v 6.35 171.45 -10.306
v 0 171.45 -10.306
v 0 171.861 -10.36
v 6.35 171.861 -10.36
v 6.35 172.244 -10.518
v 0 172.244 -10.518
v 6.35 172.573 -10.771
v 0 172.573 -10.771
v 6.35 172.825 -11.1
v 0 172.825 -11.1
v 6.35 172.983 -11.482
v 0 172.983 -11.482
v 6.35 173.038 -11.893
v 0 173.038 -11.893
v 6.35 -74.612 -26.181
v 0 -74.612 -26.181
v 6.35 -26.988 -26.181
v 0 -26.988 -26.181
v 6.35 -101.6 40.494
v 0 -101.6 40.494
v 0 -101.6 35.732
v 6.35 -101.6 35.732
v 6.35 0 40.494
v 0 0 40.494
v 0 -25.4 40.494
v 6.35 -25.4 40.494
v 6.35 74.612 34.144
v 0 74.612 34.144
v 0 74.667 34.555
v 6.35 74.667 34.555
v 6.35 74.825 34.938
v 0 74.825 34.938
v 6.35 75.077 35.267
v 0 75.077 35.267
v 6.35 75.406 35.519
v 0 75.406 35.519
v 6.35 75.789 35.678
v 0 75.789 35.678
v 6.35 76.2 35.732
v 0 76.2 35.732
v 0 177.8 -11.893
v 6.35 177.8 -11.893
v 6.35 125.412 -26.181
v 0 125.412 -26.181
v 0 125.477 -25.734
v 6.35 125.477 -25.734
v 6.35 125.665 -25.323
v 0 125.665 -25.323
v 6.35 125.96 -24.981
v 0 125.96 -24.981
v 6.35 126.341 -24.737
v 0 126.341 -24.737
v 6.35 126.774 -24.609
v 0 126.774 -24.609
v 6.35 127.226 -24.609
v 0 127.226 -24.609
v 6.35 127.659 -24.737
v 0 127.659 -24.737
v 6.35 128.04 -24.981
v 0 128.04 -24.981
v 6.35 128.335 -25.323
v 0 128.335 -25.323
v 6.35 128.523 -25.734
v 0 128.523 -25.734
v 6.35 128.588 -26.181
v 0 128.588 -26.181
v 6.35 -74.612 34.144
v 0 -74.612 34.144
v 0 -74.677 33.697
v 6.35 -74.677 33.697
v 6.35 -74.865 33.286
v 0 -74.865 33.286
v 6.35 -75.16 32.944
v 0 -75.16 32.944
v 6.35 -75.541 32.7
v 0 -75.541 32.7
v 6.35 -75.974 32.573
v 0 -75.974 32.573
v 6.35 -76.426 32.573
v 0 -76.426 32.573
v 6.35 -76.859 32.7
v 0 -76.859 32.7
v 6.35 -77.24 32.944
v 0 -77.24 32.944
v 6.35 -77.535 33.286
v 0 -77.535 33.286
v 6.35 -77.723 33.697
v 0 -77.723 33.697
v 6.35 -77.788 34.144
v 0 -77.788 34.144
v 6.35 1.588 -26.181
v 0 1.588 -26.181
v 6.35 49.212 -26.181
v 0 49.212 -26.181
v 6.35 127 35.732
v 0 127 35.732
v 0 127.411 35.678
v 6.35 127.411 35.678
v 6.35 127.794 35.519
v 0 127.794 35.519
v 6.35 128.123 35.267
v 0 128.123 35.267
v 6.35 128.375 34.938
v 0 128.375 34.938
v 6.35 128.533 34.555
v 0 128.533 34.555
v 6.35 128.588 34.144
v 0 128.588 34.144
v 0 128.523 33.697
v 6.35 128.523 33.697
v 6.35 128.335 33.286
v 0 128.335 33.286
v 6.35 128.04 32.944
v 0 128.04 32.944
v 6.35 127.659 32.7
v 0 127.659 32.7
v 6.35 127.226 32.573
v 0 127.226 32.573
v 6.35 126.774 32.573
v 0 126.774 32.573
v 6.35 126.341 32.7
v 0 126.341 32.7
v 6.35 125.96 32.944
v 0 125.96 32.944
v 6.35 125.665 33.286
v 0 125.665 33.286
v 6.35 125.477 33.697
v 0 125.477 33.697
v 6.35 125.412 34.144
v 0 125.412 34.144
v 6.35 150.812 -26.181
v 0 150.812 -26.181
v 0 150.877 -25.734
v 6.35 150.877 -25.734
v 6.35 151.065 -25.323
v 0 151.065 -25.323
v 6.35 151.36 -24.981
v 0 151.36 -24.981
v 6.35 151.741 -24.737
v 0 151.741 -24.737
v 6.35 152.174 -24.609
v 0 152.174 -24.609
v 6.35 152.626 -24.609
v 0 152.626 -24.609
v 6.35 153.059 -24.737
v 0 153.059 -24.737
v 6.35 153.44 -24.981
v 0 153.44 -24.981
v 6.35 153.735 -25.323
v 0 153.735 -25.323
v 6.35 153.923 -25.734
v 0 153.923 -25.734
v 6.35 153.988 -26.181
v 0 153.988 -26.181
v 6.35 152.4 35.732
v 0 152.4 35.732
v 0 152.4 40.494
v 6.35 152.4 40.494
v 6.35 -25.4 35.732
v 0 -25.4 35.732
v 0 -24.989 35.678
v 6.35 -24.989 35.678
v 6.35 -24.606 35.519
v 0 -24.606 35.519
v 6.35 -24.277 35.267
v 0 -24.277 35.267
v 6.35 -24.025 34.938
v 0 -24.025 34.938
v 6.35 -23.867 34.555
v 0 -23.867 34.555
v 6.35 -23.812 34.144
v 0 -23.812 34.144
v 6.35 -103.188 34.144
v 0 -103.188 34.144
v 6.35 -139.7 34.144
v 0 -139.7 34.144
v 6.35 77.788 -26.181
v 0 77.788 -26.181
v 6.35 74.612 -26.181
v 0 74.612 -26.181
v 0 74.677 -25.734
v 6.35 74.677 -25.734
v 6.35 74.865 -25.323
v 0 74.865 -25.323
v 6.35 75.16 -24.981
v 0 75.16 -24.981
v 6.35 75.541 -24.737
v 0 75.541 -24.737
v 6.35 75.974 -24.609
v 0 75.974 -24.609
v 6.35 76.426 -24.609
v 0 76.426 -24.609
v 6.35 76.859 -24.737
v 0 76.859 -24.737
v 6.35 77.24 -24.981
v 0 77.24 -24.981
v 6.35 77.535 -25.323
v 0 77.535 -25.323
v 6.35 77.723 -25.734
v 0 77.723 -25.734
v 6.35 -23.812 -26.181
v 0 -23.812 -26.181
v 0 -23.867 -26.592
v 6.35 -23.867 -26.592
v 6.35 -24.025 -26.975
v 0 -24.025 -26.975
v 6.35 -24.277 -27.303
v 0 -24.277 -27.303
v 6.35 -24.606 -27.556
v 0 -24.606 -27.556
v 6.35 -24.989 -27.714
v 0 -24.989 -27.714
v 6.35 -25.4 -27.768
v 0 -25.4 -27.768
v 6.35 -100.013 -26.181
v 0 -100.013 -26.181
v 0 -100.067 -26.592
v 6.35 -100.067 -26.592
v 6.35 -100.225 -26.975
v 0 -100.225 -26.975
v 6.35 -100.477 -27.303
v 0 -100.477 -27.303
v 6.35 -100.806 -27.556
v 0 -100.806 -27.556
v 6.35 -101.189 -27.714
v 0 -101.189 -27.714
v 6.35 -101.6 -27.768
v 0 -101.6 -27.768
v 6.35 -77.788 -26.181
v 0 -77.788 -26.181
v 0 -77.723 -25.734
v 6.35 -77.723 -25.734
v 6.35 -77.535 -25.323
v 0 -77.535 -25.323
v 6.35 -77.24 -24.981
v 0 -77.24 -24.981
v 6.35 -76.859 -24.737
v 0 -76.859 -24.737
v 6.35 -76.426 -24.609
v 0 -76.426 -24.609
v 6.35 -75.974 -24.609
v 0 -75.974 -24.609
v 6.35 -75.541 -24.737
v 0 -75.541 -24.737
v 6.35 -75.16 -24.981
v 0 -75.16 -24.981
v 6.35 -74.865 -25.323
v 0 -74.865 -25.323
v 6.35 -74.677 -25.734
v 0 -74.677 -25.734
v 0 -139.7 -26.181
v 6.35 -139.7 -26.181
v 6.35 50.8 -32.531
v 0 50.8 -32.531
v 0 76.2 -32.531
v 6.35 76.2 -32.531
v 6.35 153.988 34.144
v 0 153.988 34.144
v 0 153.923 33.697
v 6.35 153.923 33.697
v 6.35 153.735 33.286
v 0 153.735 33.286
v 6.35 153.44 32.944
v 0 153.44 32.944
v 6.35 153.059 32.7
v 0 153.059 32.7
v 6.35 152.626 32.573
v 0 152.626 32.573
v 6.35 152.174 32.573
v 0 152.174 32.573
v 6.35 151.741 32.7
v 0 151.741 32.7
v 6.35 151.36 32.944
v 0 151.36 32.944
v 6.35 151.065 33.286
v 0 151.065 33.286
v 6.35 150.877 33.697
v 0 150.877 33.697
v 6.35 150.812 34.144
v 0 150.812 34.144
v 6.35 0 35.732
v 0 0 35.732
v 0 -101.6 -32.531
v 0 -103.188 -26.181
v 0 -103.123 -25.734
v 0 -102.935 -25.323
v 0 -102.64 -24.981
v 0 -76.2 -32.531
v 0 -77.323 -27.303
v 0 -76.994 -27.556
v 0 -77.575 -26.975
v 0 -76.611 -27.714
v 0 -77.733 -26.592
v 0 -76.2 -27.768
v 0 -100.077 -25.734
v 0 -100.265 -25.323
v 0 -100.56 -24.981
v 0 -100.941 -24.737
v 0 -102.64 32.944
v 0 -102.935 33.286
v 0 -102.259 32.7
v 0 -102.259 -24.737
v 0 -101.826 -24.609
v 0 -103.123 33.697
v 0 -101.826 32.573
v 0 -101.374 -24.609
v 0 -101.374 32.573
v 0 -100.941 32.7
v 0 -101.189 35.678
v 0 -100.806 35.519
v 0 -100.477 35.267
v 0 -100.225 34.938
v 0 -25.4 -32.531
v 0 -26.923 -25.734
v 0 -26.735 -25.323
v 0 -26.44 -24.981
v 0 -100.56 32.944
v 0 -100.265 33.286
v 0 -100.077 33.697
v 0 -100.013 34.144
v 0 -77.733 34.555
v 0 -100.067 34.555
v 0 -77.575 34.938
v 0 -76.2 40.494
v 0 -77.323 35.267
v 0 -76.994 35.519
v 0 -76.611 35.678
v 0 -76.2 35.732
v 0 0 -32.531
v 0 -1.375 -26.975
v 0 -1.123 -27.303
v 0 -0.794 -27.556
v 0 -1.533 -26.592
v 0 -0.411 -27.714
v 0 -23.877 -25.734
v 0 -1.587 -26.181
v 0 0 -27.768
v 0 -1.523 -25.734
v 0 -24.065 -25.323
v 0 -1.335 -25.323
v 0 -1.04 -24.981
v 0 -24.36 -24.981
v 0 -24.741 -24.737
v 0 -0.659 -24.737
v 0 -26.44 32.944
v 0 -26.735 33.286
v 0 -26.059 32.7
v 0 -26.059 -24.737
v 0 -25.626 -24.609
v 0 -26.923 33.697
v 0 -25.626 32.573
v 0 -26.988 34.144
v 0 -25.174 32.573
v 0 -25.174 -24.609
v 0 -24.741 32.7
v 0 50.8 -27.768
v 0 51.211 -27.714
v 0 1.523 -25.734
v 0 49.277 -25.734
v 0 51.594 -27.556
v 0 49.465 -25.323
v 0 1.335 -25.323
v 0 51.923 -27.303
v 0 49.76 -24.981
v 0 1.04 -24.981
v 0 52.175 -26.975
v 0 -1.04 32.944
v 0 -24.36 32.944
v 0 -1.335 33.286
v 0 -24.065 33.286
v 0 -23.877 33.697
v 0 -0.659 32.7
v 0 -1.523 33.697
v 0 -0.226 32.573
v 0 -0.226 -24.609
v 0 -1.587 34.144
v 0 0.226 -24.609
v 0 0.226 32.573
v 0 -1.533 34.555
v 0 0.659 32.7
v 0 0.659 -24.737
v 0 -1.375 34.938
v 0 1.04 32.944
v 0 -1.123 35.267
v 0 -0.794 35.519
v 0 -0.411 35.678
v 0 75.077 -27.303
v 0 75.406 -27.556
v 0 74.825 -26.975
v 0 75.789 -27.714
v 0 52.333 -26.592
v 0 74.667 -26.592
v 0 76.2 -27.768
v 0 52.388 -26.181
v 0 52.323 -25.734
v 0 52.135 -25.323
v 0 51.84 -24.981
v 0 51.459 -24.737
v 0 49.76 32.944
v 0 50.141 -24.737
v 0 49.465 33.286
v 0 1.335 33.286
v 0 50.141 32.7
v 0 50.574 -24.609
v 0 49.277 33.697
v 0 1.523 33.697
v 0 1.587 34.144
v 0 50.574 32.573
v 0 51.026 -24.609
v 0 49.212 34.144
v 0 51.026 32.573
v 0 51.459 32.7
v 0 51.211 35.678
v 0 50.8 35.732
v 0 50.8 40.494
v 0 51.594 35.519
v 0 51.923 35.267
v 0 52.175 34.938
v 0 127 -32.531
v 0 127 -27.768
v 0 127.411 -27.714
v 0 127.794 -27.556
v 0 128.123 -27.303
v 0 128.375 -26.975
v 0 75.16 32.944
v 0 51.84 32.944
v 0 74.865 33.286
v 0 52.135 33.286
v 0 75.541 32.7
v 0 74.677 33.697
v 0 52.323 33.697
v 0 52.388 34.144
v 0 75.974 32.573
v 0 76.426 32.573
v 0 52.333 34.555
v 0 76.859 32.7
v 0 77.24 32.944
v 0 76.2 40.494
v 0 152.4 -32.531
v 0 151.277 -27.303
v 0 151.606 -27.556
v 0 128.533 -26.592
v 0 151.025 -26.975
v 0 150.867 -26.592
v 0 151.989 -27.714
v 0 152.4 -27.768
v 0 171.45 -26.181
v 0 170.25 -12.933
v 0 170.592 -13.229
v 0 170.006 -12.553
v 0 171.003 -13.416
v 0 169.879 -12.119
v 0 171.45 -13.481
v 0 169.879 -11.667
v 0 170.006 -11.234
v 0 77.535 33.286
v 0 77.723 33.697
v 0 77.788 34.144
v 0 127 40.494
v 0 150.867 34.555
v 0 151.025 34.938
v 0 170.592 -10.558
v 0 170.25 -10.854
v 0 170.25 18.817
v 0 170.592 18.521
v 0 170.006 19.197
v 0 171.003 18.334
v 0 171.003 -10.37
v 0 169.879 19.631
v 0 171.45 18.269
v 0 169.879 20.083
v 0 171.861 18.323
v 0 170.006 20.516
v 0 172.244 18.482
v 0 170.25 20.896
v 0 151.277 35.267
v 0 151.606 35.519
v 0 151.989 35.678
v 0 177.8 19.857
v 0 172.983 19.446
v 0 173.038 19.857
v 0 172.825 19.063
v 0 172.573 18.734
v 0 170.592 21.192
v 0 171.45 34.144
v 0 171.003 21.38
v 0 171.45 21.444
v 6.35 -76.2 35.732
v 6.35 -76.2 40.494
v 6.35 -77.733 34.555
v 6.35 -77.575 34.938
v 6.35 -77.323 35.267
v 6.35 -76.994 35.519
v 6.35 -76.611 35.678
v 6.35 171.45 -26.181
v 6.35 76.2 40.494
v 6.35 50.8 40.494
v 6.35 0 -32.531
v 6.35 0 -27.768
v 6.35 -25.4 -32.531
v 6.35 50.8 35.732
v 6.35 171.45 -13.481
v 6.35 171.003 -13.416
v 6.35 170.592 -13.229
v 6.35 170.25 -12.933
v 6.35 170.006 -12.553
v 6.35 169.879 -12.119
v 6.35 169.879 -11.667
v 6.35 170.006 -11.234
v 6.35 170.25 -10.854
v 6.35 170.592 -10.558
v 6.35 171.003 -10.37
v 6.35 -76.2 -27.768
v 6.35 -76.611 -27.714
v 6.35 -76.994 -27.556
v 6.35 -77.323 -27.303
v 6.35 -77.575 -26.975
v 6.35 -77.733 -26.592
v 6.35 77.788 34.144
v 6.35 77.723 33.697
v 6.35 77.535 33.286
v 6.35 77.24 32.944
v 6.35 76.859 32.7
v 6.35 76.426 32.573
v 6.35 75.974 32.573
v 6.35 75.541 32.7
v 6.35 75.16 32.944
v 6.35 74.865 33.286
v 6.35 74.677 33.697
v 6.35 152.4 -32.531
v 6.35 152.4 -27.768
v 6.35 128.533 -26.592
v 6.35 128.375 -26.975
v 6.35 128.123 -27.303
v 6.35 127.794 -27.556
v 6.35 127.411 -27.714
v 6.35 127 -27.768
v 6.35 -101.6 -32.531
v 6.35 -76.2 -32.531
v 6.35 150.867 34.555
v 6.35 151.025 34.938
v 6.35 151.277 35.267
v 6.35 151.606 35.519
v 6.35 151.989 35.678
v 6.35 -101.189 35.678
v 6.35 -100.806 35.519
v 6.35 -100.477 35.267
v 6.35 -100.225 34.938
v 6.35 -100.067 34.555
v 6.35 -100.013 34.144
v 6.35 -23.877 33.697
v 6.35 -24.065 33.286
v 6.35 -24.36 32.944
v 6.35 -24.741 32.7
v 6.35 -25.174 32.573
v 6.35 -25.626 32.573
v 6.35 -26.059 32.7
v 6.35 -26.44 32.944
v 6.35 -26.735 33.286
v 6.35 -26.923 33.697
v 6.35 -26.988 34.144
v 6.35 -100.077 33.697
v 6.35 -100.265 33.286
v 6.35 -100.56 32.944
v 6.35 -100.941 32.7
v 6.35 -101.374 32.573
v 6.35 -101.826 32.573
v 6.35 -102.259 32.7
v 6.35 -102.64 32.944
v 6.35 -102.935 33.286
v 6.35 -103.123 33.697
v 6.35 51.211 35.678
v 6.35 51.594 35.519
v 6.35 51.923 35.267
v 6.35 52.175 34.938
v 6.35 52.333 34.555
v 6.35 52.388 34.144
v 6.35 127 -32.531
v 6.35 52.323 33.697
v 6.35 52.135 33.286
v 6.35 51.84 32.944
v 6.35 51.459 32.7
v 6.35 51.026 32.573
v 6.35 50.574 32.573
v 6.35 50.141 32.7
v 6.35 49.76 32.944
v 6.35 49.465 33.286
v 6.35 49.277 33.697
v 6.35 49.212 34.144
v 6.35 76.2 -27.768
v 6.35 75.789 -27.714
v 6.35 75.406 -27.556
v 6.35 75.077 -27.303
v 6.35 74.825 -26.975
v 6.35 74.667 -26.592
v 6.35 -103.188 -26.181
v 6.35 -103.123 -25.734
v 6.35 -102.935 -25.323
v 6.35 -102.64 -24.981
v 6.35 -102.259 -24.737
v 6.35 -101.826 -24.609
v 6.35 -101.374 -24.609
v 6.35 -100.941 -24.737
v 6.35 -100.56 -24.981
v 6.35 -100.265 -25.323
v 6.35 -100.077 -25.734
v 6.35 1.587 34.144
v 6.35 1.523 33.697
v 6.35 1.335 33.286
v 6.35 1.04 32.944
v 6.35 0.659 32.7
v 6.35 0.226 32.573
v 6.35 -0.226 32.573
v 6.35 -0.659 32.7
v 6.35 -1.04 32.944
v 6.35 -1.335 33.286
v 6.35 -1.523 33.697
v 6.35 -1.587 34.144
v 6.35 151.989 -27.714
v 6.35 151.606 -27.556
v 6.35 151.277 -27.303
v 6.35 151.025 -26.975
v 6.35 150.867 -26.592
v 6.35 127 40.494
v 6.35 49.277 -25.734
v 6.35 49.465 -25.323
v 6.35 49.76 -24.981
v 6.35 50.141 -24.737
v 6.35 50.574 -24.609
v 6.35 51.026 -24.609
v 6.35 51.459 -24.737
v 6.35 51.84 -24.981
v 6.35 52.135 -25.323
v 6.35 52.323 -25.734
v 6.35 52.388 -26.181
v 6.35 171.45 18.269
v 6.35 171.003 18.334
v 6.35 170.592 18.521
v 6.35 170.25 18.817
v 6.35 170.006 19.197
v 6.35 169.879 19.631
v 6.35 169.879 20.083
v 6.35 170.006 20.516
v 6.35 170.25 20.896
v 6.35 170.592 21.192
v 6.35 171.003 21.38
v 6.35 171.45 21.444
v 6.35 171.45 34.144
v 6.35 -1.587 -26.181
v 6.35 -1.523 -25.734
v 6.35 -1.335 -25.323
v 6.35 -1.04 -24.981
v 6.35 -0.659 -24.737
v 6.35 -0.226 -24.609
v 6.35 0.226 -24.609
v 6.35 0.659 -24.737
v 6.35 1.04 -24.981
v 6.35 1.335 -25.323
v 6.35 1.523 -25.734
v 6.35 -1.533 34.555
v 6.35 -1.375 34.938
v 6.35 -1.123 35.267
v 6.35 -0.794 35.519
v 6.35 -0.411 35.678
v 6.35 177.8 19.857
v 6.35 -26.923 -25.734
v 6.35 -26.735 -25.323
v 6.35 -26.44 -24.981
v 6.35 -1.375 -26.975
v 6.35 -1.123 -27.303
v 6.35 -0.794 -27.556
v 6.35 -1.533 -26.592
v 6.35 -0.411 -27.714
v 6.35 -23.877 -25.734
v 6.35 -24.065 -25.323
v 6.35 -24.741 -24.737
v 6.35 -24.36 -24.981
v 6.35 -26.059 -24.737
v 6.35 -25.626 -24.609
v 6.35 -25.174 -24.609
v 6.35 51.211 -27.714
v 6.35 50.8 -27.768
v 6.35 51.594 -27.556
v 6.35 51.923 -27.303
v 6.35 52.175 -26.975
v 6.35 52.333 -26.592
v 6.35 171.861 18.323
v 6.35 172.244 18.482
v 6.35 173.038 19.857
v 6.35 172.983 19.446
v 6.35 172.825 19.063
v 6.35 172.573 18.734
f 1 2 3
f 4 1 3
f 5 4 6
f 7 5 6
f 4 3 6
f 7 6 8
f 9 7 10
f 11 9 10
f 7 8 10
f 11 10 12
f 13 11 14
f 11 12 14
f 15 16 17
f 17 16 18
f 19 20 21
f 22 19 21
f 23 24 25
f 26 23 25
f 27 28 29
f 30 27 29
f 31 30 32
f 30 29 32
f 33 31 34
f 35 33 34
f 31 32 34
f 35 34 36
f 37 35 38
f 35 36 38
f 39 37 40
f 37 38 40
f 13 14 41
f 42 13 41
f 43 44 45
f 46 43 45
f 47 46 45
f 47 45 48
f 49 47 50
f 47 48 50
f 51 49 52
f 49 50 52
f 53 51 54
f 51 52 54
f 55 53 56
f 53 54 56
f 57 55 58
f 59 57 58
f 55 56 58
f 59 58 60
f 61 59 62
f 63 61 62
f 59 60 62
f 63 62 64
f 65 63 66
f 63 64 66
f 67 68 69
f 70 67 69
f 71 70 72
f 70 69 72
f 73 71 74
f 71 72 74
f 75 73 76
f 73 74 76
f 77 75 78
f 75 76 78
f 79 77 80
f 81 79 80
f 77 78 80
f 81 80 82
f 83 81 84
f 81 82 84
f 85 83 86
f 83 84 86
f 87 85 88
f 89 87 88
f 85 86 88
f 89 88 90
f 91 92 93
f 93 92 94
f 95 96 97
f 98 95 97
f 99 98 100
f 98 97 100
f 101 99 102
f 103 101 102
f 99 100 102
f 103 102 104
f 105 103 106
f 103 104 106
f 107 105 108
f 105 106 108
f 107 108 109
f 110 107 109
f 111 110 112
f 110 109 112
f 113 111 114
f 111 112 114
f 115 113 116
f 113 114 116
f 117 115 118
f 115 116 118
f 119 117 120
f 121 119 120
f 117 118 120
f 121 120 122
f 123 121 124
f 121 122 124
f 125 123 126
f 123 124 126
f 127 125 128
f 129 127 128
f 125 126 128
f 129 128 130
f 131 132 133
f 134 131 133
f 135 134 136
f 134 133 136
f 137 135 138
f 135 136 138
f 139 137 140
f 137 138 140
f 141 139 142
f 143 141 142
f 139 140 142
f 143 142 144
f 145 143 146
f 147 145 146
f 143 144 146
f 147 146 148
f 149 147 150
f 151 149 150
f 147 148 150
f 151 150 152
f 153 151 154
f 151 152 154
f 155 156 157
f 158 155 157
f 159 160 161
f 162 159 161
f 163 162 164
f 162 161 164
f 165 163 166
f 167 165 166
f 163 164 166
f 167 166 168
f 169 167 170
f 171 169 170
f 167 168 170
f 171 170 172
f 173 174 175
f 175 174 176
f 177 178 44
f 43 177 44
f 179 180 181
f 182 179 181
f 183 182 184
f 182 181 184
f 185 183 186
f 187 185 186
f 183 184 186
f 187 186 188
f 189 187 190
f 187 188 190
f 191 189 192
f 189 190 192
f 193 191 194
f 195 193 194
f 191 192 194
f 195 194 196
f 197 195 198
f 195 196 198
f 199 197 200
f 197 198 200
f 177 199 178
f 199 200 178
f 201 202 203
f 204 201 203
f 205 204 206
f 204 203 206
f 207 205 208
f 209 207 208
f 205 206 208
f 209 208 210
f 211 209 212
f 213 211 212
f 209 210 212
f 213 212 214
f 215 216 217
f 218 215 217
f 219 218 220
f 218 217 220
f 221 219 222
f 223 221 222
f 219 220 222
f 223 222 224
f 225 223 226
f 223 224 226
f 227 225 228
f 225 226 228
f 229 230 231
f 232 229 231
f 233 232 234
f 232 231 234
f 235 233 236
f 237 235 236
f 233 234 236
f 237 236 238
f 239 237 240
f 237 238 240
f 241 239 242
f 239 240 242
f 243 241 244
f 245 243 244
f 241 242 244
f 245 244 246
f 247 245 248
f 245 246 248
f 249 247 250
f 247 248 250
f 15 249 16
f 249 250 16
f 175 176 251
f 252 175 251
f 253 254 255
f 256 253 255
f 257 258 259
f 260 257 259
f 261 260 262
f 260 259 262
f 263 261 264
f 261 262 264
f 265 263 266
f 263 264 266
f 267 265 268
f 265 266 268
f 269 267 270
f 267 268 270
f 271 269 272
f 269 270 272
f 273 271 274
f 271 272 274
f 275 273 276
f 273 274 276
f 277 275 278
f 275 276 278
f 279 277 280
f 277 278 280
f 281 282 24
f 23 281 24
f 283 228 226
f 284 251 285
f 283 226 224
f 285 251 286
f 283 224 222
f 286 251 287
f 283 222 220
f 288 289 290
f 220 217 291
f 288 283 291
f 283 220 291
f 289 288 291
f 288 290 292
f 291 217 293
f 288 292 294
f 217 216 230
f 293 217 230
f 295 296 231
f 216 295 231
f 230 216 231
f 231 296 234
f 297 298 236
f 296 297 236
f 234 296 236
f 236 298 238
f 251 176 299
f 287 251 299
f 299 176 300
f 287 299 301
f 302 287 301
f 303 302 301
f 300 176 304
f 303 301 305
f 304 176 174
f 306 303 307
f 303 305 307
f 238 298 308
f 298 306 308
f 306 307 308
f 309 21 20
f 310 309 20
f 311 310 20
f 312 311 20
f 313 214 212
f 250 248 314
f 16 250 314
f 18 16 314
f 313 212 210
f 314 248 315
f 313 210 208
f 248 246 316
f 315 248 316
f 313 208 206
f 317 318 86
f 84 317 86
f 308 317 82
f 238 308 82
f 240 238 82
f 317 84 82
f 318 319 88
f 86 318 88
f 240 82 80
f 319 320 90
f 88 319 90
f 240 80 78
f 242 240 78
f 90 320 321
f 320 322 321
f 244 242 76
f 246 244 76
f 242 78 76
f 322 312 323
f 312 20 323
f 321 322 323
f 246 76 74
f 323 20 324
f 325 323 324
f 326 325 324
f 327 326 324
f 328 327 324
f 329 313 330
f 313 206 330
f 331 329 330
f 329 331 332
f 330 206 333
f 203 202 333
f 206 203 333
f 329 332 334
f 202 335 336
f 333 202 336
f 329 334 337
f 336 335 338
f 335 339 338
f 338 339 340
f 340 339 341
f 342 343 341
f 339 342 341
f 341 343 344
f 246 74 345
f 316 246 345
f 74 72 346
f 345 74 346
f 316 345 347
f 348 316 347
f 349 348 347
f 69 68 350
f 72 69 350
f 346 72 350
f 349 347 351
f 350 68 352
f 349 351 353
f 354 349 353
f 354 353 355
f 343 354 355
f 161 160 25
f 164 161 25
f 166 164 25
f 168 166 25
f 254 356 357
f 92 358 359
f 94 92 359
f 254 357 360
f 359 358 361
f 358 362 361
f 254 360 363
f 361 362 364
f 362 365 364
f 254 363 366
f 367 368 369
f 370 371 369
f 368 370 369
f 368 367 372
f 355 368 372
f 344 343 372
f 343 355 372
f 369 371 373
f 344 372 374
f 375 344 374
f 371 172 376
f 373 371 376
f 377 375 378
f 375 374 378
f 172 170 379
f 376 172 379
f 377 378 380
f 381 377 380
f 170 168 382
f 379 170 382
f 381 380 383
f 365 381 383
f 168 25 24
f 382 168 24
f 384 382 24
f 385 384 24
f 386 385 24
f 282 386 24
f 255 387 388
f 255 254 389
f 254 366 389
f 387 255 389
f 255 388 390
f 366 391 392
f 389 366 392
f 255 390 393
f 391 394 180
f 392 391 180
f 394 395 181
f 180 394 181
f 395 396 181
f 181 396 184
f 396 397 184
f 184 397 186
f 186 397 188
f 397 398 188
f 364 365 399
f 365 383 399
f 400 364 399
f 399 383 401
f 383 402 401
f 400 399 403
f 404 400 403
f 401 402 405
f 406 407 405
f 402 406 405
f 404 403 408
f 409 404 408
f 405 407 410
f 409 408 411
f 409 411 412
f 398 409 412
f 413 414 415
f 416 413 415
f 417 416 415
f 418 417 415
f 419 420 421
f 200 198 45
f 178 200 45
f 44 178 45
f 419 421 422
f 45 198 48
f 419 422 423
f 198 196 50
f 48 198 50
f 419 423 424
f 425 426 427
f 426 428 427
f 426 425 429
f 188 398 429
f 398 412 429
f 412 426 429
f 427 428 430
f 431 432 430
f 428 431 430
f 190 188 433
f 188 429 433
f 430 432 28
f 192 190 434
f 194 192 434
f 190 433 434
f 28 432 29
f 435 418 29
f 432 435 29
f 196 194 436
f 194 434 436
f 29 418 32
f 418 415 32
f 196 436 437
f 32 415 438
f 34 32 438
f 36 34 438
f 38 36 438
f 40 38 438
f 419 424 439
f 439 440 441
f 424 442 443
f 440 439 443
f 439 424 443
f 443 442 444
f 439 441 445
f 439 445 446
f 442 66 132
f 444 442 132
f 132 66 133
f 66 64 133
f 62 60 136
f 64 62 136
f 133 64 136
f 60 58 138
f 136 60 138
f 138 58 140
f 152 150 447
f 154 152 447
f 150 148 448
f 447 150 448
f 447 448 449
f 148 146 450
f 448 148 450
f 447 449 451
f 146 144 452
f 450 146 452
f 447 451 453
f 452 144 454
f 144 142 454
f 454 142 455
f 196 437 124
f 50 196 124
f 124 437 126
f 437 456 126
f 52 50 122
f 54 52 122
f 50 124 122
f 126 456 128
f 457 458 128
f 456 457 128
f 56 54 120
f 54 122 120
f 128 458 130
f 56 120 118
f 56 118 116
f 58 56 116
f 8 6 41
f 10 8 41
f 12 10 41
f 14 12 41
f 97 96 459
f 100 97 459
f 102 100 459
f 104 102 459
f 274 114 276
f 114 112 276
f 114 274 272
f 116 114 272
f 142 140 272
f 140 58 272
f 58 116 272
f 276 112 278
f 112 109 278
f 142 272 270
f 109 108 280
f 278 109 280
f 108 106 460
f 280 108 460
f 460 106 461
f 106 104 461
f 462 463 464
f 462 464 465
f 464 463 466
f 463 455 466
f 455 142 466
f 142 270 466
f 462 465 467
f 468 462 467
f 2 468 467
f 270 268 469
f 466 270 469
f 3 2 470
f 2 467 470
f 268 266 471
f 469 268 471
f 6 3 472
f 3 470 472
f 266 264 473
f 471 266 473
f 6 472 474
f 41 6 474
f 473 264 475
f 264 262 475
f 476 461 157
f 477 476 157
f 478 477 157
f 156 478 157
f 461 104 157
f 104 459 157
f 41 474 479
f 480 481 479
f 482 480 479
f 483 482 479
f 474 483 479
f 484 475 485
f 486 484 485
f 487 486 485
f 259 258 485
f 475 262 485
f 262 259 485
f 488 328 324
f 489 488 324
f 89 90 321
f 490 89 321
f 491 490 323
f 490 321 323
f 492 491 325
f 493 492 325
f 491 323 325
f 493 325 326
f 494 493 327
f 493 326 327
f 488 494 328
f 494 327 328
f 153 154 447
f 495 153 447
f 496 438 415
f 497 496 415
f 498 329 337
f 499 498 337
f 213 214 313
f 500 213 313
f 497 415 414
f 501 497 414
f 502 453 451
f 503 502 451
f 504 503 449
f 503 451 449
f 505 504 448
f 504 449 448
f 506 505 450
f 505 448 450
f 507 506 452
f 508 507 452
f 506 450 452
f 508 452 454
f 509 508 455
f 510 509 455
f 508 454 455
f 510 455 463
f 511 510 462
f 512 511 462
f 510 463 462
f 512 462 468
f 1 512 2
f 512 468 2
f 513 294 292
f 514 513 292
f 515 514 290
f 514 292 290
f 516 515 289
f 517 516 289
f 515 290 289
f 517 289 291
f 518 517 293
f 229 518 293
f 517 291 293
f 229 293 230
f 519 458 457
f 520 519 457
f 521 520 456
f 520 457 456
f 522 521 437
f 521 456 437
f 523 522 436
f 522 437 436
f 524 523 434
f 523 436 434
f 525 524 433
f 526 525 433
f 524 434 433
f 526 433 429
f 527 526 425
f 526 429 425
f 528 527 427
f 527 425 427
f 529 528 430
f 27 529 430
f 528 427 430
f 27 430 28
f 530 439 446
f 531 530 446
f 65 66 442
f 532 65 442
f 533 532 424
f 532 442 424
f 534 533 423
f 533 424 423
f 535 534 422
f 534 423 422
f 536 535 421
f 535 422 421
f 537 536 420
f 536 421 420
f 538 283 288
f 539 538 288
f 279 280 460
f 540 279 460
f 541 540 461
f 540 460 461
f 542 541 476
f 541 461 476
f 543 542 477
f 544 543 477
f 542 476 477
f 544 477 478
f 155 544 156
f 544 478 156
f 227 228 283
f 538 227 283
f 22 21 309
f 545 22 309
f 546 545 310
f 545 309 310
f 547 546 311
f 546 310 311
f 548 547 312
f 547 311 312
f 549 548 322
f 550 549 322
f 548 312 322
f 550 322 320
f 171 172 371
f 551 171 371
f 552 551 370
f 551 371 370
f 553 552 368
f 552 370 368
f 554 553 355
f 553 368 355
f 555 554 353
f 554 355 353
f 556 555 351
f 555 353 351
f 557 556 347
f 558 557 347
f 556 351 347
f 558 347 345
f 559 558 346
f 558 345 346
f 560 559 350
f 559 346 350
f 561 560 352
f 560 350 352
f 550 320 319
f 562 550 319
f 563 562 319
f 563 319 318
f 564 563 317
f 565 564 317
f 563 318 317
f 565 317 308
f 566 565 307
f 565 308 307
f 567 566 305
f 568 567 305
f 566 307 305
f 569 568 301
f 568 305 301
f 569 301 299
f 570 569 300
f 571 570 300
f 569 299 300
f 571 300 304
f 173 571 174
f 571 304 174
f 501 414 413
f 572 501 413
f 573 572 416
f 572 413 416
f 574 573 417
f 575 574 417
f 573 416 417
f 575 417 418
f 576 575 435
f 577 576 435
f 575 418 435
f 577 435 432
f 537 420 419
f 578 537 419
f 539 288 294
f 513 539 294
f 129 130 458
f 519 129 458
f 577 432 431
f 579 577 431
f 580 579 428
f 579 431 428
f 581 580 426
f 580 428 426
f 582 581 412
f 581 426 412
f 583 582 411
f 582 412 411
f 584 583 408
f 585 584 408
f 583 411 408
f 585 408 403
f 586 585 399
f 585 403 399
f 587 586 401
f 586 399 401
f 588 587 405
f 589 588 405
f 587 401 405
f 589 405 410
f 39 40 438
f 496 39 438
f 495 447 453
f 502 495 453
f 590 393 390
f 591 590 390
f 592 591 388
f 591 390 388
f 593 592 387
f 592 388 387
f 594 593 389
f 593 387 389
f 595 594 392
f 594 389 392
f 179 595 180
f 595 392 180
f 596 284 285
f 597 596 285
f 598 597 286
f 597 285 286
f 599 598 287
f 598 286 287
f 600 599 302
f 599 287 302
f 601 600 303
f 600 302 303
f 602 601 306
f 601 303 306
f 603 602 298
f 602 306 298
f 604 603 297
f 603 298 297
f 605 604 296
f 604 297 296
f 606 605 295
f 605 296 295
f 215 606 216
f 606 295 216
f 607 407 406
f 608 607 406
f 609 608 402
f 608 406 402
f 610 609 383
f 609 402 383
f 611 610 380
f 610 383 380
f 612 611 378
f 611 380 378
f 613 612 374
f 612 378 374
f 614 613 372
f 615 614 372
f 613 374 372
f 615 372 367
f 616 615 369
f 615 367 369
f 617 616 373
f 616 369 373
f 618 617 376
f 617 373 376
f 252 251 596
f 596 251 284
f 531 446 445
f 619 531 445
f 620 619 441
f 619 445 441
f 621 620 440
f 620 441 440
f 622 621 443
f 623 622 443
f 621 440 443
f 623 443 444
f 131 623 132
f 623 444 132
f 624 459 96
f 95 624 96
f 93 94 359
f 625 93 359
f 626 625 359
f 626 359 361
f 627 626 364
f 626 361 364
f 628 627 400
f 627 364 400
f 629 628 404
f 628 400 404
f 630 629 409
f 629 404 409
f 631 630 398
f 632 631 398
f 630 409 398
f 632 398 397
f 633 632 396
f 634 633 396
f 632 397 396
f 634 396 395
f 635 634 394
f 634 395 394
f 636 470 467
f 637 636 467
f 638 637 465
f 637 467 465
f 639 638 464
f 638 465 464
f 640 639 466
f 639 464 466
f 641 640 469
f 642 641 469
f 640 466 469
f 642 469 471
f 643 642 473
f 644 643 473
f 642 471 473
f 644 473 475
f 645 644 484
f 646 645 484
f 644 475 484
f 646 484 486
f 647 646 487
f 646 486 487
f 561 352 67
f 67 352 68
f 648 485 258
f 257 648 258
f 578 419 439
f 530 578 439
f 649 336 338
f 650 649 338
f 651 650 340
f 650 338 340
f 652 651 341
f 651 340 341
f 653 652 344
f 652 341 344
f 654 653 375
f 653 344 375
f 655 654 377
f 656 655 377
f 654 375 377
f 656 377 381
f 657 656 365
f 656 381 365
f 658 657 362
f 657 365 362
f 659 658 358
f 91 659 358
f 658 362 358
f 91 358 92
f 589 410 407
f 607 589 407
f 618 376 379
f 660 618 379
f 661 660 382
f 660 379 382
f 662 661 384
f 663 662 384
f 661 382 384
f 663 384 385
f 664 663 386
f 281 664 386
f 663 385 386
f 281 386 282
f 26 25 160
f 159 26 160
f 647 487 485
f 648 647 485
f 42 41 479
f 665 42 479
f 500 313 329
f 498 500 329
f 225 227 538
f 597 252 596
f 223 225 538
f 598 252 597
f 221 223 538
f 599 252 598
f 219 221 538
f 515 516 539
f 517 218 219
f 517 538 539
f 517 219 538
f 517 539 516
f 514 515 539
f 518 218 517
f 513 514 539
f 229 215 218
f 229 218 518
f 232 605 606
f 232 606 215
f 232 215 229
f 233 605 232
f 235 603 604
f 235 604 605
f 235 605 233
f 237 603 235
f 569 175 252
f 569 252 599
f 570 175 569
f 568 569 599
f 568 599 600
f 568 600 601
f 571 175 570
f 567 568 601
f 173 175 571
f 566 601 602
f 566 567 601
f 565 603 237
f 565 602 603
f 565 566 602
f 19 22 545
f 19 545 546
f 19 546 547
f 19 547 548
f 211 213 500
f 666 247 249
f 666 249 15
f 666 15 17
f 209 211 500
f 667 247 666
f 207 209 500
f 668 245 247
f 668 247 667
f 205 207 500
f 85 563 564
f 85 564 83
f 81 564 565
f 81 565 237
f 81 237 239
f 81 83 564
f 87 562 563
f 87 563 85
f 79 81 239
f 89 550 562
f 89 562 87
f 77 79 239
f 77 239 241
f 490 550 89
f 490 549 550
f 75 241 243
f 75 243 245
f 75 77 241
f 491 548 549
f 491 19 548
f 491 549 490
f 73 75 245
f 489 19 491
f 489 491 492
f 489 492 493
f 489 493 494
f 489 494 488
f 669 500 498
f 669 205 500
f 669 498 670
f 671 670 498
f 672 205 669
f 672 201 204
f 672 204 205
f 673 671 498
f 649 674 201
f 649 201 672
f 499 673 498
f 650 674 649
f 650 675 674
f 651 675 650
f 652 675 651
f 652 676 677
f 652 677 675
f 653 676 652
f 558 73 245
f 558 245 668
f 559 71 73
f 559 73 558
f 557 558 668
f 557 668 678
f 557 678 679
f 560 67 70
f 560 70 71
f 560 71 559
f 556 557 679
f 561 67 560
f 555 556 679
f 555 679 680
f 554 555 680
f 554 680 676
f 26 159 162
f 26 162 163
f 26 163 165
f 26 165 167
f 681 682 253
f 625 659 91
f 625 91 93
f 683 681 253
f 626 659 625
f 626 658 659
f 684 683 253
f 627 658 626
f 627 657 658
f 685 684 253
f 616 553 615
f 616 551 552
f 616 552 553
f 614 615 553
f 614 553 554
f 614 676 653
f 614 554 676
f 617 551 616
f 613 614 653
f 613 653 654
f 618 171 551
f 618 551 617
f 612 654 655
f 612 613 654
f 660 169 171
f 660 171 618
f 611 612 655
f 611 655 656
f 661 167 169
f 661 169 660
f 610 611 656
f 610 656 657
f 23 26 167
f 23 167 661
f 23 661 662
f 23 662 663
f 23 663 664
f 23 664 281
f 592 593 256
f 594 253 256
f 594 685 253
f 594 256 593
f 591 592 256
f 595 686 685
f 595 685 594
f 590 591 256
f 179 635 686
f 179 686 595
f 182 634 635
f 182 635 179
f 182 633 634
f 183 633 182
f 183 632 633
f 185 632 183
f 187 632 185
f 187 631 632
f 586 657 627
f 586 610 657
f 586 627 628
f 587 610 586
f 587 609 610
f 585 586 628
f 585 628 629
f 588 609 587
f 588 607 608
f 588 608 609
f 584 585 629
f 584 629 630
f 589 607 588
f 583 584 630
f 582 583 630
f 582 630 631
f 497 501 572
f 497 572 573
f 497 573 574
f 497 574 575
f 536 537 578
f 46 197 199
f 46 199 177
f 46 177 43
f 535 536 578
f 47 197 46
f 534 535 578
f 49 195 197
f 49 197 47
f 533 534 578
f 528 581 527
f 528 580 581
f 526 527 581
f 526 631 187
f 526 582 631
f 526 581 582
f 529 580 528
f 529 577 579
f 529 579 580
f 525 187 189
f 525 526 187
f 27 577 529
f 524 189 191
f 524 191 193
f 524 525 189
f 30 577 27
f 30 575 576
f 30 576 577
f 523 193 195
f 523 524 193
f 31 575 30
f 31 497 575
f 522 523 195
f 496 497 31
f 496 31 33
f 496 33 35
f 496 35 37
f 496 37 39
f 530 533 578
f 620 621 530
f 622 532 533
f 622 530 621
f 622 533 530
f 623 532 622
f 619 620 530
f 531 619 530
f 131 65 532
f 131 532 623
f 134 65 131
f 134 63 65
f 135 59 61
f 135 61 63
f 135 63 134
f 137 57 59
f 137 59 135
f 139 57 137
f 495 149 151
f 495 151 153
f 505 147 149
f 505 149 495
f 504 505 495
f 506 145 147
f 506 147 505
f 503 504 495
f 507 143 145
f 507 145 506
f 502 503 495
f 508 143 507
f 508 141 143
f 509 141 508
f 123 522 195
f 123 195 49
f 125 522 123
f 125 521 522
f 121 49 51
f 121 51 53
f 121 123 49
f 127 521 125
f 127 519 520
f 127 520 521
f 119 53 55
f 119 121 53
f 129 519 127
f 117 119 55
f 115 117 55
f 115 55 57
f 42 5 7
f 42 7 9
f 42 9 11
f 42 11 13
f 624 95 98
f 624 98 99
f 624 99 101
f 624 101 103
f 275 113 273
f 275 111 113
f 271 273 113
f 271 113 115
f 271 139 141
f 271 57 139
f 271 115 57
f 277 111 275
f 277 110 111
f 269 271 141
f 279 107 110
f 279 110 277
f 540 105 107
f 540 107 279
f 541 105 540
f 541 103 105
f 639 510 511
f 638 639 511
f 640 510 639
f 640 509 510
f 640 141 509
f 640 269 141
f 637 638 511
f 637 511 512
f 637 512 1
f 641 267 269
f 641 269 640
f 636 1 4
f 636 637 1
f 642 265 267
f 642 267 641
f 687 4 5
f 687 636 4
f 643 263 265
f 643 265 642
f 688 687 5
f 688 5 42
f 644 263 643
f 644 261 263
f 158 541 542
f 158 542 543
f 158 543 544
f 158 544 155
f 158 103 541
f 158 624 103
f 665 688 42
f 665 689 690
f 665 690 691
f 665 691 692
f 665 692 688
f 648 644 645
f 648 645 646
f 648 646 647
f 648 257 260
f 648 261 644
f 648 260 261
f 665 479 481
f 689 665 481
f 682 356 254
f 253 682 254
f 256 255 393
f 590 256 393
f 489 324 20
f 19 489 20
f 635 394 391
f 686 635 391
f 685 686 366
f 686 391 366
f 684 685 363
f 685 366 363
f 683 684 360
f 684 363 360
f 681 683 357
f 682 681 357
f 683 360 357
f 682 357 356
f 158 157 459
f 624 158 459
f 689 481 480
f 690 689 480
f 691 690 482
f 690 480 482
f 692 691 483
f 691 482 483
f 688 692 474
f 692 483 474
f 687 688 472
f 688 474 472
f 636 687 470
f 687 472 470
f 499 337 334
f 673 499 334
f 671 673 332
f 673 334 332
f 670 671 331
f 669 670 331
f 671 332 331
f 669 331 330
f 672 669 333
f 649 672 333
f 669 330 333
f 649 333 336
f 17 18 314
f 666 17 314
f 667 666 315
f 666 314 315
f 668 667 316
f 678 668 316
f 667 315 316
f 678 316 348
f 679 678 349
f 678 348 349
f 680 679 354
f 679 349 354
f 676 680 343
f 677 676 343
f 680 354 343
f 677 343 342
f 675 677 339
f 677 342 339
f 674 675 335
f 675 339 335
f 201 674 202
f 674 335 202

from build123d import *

# Parameters (mm, degrees)
F1_DEPTH = 6.35


with BuildPart() as f1:
    # F0 (on Right) → F1 (new body)
    with BuildSketch(Plane.YZ):
        with BuildLine():
            Line((-77.7875, 34.144226), (-100.0125, 34.144226))
            ThreePointArc((-100.0125, 34.144226), (-101.6, 32.556726), (-103.1875, 34.144226))
            Line((-103.1875, 34.144226), (-139.7, 34.144226))
            Line((-139.7, 34.144226), (-139.7, -26.180774))
            Line((-139.7, -26.180774), (-103.1875, -26.180774))
            ThreePointArc((-103.1875, -26.180774), (-101.6, -24.593274), (-100.0125, -26.180774))
            Line((-100.0125, -26.180774), (-77.7875, -26.180774))
            ThreePointArc((-77.7875, -26.180774), (-76.2, -24.593274), (-74.6125, -26.180774))
            Line((-74.6125, -26.180774), (-26.9875, -26.180774))
            ThreePointArc((-26.9875, -26.180774), (-25.4, -24.593274), (-23.8125, -26.180774))
            Line((-23.8125, -26.180774), (-1.5875, -26.180774))
            ThreePointArc((-1.5875, -26.180774), (0, -24.593274), (1.5875, -26.180774))
            Line((1.5875, -26.180774), (49.2125, -26.180774))
            ThreePointArc((49.2125, -26.180774), (50.8, -24.593274), (52.3875, -26.180774))
            Line((52.3875, -26.180774), (74.6125, -26.180774))
            ThreePointArc((74.6125, -26.180774), (76.2, -24.593274), (77.7875, -26.180774))
            Line((77.7875, -26.180774), (125.4125, -26.180774))
            ThreePointArc((125.4125, -26.180774), (127, -24.593274), (128.5875, -26.180774))
            Line((128.5875, -26.180774), (150.8125, -26.180774))
            ThreePointArc((150.8125, -26.180774), (152.4, -24.593274), (153.9875, -26.180774))
            Line((153.9875, -26.180774), (171.45, -26.180774))
            Line((171.45, -26.180774), (171.45, -13.480774))
            ThreePointArc((171.45, -13.480774), (169.8625, -11.893274), (171.45, -10.305774))
            Line((171.45, -10.305774), (171.45, 18.269226))
            ThreePointArc((171.45, 18.269226), (169.8625, 19.856726), (171.45, 21.444226))
            Line((171.45, 21.444226), (171.45, 34.144226))
            Line((171.45, 34.144226), (153.9875, 34.144226))
            ThreePointArc((153.9875, 34.144226), (152.4, 32.556726), (150.8125, 34.144226))
            Line((150.8125, 34.144226), (128.5875, 34.144226))
            ThreePointArc((128.5875, 34.144226), (127, 32.556726), (125.4125, 34.144226))
            Line((125.4125, 34.144226), (77.7875, 34.144226))
            ThreePointArc((77.7875, 34.144226), (76.2, 32.556726), (74.6125, 34.144226))
            Line((74.6125, 34.144226), (52.3875, 34.144226))
            ThreePointArc((52.3875, 34.144226), (50.8, 32.556726), (49.2125, 34.144226))
            Line((49.2125, 34.144226), (1.5875, 34.144226))
            ThreePointArc((1.5875, 34.144226), (0, 32.556726), (-1.5875, 34.144226))
            Line((-1.5875, 34.144226), (-23.8125, 34.144226))
            ThreePointArc((-23.8125, 34.144226), (-25.4, 32.556726), (-26.9875, 34.144226))
            Line((-26.9875, 34.144226), (-74.6125, 34.144226))
            ThreePointArc((-74.6125, 34.144226), (-76.2, 32.556726), (-77.7875, 34.144226))
        make_face()
        with BuildLine():
            ThreePointArc((-101.6, 35.731726), (-100.477468, 35.266758), (-100.0125, 34.144226))
            Line((-100.0125, 34.144226), (-77.7875, 34.144226))
            ThreePointArc((-77.7875, 34.144226), (-77.322532, 35.266758), (-76.2, 35.731726))
            Line((-76.2, 35.731726), (-76.2, 40.494226))
            Line((-76.2, 40.494226), (-101.6, 40.494226))
            Line((-101.6, 40.494226), (-101.6, 35.731726))
        make_face()
        with BuildLine():
            Line((-25.4, 40.494226), (-25.4, 35.731726))
            ThreePointArc((-25.4, 35.731726), (-24.277468, 35.266758), (-23.8125, 34.144226))
            Line((-23.8125, 34.144226), (-1.5875, 34.144226))
            ThreePointArc((-1.5875, 34.144226), (-1.122532, 35.266758), (0, 35.731726))
            Line((0, 35.731726), (0, 40.494226))
            Line((0, 40.494226), (-25.4, 40.494226))
        make_face()
        with BuildLine():
            Line((50.8, 40.494226), (50.8, 35.731726))
            ThreePointArc((50.8, 35.731726), (51.922532, 35.266758), (52.3875, 34.144226))
            Line((52.3875, 34.144226), (74.6125, 34.144226))
            ThreePointArc((74.6125, 34.144226), (75.077468, 35.266758), (76.2, 35.731726))
            Line((76.2, 35.731726), (76.2, 40.494226))
            Line((76.2, 40.494226), (50.8, 40.494226))
        make_face()
        with BuildLine():
            Line((127, 40.494226), (127, 35.731726))
            ThreePointArc((127, 35.731726), (128.122532, 35.266758), (128.5875, 34.144226))
            Line((128.5875, 34.144226), (150.8125, 34.144226))
            ThreePointArc((150.8125, 34.144226), (151.277468, 35.266758), (152.4, 35.731726))
            Line((152.4, 35.731726), (152.4, 40.494226))
            Line((152.4, 40.494226), (127, 40.494226))
        make_face()
        with BuildLine():
            Line((177.8, 19.856726), (173.0375, 19.856726))
            ThreePointArc((173.0375, 19.856726), (172.572532, 18.734194), (171.45, 18.269226))
            Line((171.45, 18.269226), (171.45, -10.305774))
            ThreePointArc((171.45, -10.305774), (172.572532, -10.770742), (173.0375, -11.893274))
            Line((173.0375, -11.893274), (177.8, -11.893274))
            Line((177.8, -11.893274), (177.8, 19.856726))
        make_face()
        with BuildLine():
            Line((150.8125, -26.180774), (128.5875, -26.180774))
            ThreePointArc((128.5875, -26.180774), (128.122532, -27.303306), (127, -27.768274))
            Line((127, -27.768274), (127, -32.530774))
            Line((127, -32.530774), (152.4, -32.530774))
            Line((152.4, -32.530774), (152.4, -27.768274))
            ThreePointArc((152.4, -27.768274), (151.277468, -27.303306), (150.8125, -26.180774))
        make_face()
        with BuildLine():
            Line((74.6125, -26.180774), (52.3875, -26.180774))
            ThreePointArc((52.3875, -26.180774), (51.922532, -27.303306), (50.8, -27.768274))
            Line((50.8, -27.768274), (50.8, -32.530774))
            Line((50.8, -32.530774), (76.2, -32.530774))
            Line((76.2, -32.530774), (76.2, -27.768274))
            ThreePointArc((76.2, -27.768274), (75.077468, -27.303306), (74.6125, -26.180774))
        make_face()
        with BuildLine():
            Line((-1.5875, -26.180774), (-23.8125, -26.180774))
            ThreePointArc((-23.8125, -26.180774), (-24.277468, -27.303306), (-25.4, -27.768274))
            Line((-25.4, -27.768274), (-25.4, -32.530774))
            Line((-25.4, -32.530774), (0, -32.530774))
            Line((0, -32.530774), (0, -27.768274))
            ThreePointArc((0, -27.768274), (-1.122532, -27.303306), (-1.5875, -26.180774))
        make_face()
        with BuildLine():
            Line((-77.7875, -26.180774), (-100.0125, -26.180774))
            ThreePointArc((-100.0125, -26.180774), (-100.477468, -27.303306), (-101.6, -27.768274))
            Line((-101.6, -27.768274), (-101.6, -32.530774))
            Line((-101.6, -32.530774), (-76.2, -32.530774))
            Line((-76.2, -32.530774), (-76.2, -27.768274))
            ThreePointArc((-76.2, -27.768274), (-77.322532, -27.303306), (-77.7875, -26.180774))
        make_face()
    extrude(amount=F1_DEPTH)


solid = f1.part
